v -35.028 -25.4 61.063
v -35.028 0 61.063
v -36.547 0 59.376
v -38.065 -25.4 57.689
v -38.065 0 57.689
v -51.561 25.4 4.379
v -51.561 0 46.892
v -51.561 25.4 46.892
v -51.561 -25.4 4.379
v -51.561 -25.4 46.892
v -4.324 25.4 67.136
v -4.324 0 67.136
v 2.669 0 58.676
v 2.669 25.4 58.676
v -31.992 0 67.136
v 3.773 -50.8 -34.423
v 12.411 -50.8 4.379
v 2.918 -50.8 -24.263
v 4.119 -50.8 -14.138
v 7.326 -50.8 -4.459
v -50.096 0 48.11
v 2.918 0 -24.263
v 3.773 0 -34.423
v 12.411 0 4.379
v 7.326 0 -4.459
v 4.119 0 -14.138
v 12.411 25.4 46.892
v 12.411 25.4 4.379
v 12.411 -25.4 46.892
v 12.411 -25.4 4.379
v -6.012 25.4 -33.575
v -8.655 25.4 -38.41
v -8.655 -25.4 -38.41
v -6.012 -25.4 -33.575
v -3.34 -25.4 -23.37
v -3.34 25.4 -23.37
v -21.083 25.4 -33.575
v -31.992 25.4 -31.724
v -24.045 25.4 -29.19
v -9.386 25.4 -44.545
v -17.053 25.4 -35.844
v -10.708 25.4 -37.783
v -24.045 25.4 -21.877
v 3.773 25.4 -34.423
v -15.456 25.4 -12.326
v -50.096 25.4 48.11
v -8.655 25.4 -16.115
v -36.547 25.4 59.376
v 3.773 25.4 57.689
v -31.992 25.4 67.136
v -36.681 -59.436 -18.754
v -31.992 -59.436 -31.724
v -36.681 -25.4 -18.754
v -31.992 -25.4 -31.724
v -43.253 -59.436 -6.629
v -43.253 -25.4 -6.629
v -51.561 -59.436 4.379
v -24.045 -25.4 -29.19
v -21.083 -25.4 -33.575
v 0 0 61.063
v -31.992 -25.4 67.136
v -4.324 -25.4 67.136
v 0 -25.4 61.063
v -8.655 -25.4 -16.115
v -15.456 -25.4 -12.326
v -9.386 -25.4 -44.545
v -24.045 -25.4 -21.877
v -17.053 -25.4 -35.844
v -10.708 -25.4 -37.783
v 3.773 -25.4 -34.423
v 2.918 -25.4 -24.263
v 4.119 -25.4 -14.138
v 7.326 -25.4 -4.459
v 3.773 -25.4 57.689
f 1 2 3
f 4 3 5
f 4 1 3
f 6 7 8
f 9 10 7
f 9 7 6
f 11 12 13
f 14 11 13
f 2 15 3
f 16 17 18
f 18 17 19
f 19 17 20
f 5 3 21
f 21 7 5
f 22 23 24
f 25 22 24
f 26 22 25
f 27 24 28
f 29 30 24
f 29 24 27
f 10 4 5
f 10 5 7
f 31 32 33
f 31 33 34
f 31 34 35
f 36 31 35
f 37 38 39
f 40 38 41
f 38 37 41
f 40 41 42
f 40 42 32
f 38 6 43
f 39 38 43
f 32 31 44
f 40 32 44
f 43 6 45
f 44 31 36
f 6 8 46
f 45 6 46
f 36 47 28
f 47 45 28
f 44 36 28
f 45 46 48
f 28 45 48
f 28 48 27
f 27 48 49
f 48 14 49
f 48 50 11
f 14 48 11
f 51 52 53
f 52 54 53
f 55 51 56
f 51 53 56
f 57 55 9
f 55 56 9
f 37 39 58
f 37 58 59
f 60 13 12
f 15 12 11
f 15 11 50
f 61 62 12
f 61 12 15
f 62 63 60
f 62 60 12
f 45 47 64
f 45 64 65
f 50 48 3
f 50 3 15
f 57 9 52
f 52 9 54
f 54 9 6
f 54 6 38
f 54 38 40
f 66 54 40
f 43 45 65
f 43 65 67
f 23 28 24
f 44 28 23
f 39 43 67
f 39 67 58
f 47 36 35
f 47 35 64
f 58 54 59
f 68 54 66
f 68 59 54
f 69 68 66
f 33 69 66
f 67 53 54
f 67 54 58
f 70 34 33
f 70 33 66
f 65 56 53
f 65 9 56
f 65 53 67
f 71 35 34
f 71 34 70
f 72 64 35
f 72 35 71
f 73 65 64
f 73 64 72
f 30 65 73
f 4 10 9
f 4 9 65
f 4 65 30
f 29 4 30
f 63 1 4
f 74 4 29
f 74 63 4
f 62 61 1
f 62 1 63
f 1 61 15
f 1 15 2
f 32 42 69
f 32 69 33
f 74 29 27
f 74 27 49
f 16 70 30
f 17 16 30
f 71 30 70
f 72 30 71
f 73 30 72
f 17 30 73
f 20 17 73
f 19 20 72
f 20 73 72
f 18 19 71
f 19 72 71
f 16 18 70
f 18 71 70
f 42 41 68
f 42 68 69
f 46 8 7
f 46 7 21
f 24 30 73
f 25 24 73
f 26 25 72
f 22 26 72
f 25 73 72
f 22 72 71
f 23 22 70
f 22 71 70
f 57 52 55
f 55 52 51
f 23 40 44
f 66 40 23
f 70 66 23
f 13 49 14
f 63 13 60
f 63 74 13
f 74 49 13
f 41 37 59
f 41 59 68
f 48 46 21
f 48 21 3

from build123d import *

# Parameters (mm, degrees)
F1_DEPTH  = 25.4
F2_DEPTH  = 25.4
F5_DEPTH  = 51.054
F6_DEPTH  = 25.4
F8_DEPTH  = 25.146
F9_DEPTH  = 8.89
F11_DEPTH = 25.4
F12_DEPTH = 81.788


with BuildPart() as f1:
    # F0 (on Front) → F1 (new body)
    with BuildSketch(Plane.XZ):
        Polygon((-38.0650572479, 57.6888509095), (-51.5612922609, 46.8918569386), (-51.5612922609, 24.2856629193), (-51.5612922609, 4.3787150644), (-31.9917500019, -31.7237153649), (-9.3855569139, -44.5451401174), (3.7732720375, -34.4229638577), (12.4108719826, 4.3787150644), (12.4108719826, 24.2856629193), (12.4108719826, 46.8918569386), (3.7732720375, 57.6888509095), (0, 61.0629059374), (-4.3244678527, 67.1362131834), (-31.9917500019, 67.1362131834), (-35.0284054875, 61.0629059374), align=None)
    extrude(amount=F1_DEPTH)

    # F2 (add): a face of the model
    f2_faces = [f1.faces().sort_by_distance(p)[0] for p in [
        (-18.1670820448, 0, 15.6166909792),
    ]]
    extrude(f2_faces, amount=F2_DEPTH)

    # F4 (on face) → F5 (cut)
    with BuildSketch(Plane.XZ.offset(25.4)):
        with BuildLine():
            ThreePointArc((12.4108719826, 4.3787150644), (4.1185646874, -14.1375862121), (3.7732720375, -34.4229638577))
            Line((3.7732720375, -34.4229638577), (12.4108719826, 4.3787150644))
        make_face()
    extrude(amount=-F5_DEPTH, mode=Mode.SUBTRACT)

    # F4 (on face) + F3 (on face) → F6 (join)
    with BuildSketch(Plane.XZ.offset(25.4)):
        with BuildLine():
            Line((3.7732720375, -34.4229638577), (12.4108719826, 4.3787150644))
            ThreePointArc((12.4108719826, 4.3787150644), (4.1185646874, -14.1375862121), (3.7732720375, -34.4229638577))
        make_face()
    with BuildSketch(Plane(origin=(0, 25.4, 0), x_dir=(-1, 0, 0), z_dir=(0, 1, 0))):
        Polygon((18.1581089273, 67.1362131834), (4.3244678527, 67.1362131834), (-12.4108719826, 46.8918569386), (-12.4108719826, 4.3787150644), (-3.7732720375, -34.4229638577), (9.3855569139, -44.5451401174), (31.9917500019, -31.7237153649), (51.5612922609, 4.3787150644), (51.5612922609, 46.8918569386), (50.0958084087, 48.1103495756), (36.5467313677, 59.3758784235), (31.9917500019, 67.1362131834), align=None)
    extrude(amount=F6_DEPTH, dir=(0, -1, 0))

    # F7 (on face) → F8 (join)
    with BuildSketch(Plane.XZ.offset(25.4)):
        with BuildLine():
            Line((-51.5612922609, 4.3787150644), (-31.9917500019, -31.7237153649))
            ThreePointArc((-31.9917500019, -31.7237153649), (-39.7394624087, -12.568300065), (-51.5612922609, 4.3787150644))
        make_face()
    extrude(amount=F8_DEPTH)

    # F9 (add): a face of the model
    f9_faces = [f1.faces().sort_by_distance(p)[0] for p in [
        (-40.9608129672, -50.546, -13.2303405726),
    ]]
    extrude(f9_faces, amount=F9_DEPTH)

    # F10 (on face) → F11 (join)
    with BuildSketch(Plane.XZ.offset(25.4)):
        Polygon((-15.4559531359, -12.3257856039), (-24.0448707213, -21.8765659441), (-24.0448707213, -29.190047577), (-21.0833395748, -33.5754018863), (-17.0532407374, -35.8441268439), (-10.7082539019, -37.7830361114), (-8.6549719673, -38.4104806555), (-6.0115899485, -33.5754018863), (-3.3401730916, -23.3702346121), (-8.6549719673, -16.1149992003), align=None)
        with BuildLine():
            ThreePointArc((-7.757912569, -35.5995865712), (-8.682855395, -37.4347954064), (-10.7082539019, -37.7830361114))
            ThreePointArc((-10.7082539019, -37.7830361114), (-11.3992094948, -33.7643777359), (-7.757912569, -35.5995865712))
        make_face(mode=Mode.SUBTRACT)
        with BuildLine():
            ThreePointArc((-7.757912569, -35.5995865712), (-11.3992094948, -33.7643777359), (-10.7082539019, -37.7830361114))
            ThreePointArc((-10.7082539019, -37.7830361114), (-8.682855395, -37.4347954064), (-7.757912569, -35.5995865712))
        make_face()
    extrude(amount=F11_DEPTH)

    # F12 (cut): a face of the model
    f12_faces = [f1.faces().sort_by_distance(p)[0] for p in [
        (-13.8577051809, -50.8, -25.7582591051),
    ]]
    extrude(f12_faces, amount=-F12_DEPTH, mode=Mode.SUBTRACT)


solid = f1.part
